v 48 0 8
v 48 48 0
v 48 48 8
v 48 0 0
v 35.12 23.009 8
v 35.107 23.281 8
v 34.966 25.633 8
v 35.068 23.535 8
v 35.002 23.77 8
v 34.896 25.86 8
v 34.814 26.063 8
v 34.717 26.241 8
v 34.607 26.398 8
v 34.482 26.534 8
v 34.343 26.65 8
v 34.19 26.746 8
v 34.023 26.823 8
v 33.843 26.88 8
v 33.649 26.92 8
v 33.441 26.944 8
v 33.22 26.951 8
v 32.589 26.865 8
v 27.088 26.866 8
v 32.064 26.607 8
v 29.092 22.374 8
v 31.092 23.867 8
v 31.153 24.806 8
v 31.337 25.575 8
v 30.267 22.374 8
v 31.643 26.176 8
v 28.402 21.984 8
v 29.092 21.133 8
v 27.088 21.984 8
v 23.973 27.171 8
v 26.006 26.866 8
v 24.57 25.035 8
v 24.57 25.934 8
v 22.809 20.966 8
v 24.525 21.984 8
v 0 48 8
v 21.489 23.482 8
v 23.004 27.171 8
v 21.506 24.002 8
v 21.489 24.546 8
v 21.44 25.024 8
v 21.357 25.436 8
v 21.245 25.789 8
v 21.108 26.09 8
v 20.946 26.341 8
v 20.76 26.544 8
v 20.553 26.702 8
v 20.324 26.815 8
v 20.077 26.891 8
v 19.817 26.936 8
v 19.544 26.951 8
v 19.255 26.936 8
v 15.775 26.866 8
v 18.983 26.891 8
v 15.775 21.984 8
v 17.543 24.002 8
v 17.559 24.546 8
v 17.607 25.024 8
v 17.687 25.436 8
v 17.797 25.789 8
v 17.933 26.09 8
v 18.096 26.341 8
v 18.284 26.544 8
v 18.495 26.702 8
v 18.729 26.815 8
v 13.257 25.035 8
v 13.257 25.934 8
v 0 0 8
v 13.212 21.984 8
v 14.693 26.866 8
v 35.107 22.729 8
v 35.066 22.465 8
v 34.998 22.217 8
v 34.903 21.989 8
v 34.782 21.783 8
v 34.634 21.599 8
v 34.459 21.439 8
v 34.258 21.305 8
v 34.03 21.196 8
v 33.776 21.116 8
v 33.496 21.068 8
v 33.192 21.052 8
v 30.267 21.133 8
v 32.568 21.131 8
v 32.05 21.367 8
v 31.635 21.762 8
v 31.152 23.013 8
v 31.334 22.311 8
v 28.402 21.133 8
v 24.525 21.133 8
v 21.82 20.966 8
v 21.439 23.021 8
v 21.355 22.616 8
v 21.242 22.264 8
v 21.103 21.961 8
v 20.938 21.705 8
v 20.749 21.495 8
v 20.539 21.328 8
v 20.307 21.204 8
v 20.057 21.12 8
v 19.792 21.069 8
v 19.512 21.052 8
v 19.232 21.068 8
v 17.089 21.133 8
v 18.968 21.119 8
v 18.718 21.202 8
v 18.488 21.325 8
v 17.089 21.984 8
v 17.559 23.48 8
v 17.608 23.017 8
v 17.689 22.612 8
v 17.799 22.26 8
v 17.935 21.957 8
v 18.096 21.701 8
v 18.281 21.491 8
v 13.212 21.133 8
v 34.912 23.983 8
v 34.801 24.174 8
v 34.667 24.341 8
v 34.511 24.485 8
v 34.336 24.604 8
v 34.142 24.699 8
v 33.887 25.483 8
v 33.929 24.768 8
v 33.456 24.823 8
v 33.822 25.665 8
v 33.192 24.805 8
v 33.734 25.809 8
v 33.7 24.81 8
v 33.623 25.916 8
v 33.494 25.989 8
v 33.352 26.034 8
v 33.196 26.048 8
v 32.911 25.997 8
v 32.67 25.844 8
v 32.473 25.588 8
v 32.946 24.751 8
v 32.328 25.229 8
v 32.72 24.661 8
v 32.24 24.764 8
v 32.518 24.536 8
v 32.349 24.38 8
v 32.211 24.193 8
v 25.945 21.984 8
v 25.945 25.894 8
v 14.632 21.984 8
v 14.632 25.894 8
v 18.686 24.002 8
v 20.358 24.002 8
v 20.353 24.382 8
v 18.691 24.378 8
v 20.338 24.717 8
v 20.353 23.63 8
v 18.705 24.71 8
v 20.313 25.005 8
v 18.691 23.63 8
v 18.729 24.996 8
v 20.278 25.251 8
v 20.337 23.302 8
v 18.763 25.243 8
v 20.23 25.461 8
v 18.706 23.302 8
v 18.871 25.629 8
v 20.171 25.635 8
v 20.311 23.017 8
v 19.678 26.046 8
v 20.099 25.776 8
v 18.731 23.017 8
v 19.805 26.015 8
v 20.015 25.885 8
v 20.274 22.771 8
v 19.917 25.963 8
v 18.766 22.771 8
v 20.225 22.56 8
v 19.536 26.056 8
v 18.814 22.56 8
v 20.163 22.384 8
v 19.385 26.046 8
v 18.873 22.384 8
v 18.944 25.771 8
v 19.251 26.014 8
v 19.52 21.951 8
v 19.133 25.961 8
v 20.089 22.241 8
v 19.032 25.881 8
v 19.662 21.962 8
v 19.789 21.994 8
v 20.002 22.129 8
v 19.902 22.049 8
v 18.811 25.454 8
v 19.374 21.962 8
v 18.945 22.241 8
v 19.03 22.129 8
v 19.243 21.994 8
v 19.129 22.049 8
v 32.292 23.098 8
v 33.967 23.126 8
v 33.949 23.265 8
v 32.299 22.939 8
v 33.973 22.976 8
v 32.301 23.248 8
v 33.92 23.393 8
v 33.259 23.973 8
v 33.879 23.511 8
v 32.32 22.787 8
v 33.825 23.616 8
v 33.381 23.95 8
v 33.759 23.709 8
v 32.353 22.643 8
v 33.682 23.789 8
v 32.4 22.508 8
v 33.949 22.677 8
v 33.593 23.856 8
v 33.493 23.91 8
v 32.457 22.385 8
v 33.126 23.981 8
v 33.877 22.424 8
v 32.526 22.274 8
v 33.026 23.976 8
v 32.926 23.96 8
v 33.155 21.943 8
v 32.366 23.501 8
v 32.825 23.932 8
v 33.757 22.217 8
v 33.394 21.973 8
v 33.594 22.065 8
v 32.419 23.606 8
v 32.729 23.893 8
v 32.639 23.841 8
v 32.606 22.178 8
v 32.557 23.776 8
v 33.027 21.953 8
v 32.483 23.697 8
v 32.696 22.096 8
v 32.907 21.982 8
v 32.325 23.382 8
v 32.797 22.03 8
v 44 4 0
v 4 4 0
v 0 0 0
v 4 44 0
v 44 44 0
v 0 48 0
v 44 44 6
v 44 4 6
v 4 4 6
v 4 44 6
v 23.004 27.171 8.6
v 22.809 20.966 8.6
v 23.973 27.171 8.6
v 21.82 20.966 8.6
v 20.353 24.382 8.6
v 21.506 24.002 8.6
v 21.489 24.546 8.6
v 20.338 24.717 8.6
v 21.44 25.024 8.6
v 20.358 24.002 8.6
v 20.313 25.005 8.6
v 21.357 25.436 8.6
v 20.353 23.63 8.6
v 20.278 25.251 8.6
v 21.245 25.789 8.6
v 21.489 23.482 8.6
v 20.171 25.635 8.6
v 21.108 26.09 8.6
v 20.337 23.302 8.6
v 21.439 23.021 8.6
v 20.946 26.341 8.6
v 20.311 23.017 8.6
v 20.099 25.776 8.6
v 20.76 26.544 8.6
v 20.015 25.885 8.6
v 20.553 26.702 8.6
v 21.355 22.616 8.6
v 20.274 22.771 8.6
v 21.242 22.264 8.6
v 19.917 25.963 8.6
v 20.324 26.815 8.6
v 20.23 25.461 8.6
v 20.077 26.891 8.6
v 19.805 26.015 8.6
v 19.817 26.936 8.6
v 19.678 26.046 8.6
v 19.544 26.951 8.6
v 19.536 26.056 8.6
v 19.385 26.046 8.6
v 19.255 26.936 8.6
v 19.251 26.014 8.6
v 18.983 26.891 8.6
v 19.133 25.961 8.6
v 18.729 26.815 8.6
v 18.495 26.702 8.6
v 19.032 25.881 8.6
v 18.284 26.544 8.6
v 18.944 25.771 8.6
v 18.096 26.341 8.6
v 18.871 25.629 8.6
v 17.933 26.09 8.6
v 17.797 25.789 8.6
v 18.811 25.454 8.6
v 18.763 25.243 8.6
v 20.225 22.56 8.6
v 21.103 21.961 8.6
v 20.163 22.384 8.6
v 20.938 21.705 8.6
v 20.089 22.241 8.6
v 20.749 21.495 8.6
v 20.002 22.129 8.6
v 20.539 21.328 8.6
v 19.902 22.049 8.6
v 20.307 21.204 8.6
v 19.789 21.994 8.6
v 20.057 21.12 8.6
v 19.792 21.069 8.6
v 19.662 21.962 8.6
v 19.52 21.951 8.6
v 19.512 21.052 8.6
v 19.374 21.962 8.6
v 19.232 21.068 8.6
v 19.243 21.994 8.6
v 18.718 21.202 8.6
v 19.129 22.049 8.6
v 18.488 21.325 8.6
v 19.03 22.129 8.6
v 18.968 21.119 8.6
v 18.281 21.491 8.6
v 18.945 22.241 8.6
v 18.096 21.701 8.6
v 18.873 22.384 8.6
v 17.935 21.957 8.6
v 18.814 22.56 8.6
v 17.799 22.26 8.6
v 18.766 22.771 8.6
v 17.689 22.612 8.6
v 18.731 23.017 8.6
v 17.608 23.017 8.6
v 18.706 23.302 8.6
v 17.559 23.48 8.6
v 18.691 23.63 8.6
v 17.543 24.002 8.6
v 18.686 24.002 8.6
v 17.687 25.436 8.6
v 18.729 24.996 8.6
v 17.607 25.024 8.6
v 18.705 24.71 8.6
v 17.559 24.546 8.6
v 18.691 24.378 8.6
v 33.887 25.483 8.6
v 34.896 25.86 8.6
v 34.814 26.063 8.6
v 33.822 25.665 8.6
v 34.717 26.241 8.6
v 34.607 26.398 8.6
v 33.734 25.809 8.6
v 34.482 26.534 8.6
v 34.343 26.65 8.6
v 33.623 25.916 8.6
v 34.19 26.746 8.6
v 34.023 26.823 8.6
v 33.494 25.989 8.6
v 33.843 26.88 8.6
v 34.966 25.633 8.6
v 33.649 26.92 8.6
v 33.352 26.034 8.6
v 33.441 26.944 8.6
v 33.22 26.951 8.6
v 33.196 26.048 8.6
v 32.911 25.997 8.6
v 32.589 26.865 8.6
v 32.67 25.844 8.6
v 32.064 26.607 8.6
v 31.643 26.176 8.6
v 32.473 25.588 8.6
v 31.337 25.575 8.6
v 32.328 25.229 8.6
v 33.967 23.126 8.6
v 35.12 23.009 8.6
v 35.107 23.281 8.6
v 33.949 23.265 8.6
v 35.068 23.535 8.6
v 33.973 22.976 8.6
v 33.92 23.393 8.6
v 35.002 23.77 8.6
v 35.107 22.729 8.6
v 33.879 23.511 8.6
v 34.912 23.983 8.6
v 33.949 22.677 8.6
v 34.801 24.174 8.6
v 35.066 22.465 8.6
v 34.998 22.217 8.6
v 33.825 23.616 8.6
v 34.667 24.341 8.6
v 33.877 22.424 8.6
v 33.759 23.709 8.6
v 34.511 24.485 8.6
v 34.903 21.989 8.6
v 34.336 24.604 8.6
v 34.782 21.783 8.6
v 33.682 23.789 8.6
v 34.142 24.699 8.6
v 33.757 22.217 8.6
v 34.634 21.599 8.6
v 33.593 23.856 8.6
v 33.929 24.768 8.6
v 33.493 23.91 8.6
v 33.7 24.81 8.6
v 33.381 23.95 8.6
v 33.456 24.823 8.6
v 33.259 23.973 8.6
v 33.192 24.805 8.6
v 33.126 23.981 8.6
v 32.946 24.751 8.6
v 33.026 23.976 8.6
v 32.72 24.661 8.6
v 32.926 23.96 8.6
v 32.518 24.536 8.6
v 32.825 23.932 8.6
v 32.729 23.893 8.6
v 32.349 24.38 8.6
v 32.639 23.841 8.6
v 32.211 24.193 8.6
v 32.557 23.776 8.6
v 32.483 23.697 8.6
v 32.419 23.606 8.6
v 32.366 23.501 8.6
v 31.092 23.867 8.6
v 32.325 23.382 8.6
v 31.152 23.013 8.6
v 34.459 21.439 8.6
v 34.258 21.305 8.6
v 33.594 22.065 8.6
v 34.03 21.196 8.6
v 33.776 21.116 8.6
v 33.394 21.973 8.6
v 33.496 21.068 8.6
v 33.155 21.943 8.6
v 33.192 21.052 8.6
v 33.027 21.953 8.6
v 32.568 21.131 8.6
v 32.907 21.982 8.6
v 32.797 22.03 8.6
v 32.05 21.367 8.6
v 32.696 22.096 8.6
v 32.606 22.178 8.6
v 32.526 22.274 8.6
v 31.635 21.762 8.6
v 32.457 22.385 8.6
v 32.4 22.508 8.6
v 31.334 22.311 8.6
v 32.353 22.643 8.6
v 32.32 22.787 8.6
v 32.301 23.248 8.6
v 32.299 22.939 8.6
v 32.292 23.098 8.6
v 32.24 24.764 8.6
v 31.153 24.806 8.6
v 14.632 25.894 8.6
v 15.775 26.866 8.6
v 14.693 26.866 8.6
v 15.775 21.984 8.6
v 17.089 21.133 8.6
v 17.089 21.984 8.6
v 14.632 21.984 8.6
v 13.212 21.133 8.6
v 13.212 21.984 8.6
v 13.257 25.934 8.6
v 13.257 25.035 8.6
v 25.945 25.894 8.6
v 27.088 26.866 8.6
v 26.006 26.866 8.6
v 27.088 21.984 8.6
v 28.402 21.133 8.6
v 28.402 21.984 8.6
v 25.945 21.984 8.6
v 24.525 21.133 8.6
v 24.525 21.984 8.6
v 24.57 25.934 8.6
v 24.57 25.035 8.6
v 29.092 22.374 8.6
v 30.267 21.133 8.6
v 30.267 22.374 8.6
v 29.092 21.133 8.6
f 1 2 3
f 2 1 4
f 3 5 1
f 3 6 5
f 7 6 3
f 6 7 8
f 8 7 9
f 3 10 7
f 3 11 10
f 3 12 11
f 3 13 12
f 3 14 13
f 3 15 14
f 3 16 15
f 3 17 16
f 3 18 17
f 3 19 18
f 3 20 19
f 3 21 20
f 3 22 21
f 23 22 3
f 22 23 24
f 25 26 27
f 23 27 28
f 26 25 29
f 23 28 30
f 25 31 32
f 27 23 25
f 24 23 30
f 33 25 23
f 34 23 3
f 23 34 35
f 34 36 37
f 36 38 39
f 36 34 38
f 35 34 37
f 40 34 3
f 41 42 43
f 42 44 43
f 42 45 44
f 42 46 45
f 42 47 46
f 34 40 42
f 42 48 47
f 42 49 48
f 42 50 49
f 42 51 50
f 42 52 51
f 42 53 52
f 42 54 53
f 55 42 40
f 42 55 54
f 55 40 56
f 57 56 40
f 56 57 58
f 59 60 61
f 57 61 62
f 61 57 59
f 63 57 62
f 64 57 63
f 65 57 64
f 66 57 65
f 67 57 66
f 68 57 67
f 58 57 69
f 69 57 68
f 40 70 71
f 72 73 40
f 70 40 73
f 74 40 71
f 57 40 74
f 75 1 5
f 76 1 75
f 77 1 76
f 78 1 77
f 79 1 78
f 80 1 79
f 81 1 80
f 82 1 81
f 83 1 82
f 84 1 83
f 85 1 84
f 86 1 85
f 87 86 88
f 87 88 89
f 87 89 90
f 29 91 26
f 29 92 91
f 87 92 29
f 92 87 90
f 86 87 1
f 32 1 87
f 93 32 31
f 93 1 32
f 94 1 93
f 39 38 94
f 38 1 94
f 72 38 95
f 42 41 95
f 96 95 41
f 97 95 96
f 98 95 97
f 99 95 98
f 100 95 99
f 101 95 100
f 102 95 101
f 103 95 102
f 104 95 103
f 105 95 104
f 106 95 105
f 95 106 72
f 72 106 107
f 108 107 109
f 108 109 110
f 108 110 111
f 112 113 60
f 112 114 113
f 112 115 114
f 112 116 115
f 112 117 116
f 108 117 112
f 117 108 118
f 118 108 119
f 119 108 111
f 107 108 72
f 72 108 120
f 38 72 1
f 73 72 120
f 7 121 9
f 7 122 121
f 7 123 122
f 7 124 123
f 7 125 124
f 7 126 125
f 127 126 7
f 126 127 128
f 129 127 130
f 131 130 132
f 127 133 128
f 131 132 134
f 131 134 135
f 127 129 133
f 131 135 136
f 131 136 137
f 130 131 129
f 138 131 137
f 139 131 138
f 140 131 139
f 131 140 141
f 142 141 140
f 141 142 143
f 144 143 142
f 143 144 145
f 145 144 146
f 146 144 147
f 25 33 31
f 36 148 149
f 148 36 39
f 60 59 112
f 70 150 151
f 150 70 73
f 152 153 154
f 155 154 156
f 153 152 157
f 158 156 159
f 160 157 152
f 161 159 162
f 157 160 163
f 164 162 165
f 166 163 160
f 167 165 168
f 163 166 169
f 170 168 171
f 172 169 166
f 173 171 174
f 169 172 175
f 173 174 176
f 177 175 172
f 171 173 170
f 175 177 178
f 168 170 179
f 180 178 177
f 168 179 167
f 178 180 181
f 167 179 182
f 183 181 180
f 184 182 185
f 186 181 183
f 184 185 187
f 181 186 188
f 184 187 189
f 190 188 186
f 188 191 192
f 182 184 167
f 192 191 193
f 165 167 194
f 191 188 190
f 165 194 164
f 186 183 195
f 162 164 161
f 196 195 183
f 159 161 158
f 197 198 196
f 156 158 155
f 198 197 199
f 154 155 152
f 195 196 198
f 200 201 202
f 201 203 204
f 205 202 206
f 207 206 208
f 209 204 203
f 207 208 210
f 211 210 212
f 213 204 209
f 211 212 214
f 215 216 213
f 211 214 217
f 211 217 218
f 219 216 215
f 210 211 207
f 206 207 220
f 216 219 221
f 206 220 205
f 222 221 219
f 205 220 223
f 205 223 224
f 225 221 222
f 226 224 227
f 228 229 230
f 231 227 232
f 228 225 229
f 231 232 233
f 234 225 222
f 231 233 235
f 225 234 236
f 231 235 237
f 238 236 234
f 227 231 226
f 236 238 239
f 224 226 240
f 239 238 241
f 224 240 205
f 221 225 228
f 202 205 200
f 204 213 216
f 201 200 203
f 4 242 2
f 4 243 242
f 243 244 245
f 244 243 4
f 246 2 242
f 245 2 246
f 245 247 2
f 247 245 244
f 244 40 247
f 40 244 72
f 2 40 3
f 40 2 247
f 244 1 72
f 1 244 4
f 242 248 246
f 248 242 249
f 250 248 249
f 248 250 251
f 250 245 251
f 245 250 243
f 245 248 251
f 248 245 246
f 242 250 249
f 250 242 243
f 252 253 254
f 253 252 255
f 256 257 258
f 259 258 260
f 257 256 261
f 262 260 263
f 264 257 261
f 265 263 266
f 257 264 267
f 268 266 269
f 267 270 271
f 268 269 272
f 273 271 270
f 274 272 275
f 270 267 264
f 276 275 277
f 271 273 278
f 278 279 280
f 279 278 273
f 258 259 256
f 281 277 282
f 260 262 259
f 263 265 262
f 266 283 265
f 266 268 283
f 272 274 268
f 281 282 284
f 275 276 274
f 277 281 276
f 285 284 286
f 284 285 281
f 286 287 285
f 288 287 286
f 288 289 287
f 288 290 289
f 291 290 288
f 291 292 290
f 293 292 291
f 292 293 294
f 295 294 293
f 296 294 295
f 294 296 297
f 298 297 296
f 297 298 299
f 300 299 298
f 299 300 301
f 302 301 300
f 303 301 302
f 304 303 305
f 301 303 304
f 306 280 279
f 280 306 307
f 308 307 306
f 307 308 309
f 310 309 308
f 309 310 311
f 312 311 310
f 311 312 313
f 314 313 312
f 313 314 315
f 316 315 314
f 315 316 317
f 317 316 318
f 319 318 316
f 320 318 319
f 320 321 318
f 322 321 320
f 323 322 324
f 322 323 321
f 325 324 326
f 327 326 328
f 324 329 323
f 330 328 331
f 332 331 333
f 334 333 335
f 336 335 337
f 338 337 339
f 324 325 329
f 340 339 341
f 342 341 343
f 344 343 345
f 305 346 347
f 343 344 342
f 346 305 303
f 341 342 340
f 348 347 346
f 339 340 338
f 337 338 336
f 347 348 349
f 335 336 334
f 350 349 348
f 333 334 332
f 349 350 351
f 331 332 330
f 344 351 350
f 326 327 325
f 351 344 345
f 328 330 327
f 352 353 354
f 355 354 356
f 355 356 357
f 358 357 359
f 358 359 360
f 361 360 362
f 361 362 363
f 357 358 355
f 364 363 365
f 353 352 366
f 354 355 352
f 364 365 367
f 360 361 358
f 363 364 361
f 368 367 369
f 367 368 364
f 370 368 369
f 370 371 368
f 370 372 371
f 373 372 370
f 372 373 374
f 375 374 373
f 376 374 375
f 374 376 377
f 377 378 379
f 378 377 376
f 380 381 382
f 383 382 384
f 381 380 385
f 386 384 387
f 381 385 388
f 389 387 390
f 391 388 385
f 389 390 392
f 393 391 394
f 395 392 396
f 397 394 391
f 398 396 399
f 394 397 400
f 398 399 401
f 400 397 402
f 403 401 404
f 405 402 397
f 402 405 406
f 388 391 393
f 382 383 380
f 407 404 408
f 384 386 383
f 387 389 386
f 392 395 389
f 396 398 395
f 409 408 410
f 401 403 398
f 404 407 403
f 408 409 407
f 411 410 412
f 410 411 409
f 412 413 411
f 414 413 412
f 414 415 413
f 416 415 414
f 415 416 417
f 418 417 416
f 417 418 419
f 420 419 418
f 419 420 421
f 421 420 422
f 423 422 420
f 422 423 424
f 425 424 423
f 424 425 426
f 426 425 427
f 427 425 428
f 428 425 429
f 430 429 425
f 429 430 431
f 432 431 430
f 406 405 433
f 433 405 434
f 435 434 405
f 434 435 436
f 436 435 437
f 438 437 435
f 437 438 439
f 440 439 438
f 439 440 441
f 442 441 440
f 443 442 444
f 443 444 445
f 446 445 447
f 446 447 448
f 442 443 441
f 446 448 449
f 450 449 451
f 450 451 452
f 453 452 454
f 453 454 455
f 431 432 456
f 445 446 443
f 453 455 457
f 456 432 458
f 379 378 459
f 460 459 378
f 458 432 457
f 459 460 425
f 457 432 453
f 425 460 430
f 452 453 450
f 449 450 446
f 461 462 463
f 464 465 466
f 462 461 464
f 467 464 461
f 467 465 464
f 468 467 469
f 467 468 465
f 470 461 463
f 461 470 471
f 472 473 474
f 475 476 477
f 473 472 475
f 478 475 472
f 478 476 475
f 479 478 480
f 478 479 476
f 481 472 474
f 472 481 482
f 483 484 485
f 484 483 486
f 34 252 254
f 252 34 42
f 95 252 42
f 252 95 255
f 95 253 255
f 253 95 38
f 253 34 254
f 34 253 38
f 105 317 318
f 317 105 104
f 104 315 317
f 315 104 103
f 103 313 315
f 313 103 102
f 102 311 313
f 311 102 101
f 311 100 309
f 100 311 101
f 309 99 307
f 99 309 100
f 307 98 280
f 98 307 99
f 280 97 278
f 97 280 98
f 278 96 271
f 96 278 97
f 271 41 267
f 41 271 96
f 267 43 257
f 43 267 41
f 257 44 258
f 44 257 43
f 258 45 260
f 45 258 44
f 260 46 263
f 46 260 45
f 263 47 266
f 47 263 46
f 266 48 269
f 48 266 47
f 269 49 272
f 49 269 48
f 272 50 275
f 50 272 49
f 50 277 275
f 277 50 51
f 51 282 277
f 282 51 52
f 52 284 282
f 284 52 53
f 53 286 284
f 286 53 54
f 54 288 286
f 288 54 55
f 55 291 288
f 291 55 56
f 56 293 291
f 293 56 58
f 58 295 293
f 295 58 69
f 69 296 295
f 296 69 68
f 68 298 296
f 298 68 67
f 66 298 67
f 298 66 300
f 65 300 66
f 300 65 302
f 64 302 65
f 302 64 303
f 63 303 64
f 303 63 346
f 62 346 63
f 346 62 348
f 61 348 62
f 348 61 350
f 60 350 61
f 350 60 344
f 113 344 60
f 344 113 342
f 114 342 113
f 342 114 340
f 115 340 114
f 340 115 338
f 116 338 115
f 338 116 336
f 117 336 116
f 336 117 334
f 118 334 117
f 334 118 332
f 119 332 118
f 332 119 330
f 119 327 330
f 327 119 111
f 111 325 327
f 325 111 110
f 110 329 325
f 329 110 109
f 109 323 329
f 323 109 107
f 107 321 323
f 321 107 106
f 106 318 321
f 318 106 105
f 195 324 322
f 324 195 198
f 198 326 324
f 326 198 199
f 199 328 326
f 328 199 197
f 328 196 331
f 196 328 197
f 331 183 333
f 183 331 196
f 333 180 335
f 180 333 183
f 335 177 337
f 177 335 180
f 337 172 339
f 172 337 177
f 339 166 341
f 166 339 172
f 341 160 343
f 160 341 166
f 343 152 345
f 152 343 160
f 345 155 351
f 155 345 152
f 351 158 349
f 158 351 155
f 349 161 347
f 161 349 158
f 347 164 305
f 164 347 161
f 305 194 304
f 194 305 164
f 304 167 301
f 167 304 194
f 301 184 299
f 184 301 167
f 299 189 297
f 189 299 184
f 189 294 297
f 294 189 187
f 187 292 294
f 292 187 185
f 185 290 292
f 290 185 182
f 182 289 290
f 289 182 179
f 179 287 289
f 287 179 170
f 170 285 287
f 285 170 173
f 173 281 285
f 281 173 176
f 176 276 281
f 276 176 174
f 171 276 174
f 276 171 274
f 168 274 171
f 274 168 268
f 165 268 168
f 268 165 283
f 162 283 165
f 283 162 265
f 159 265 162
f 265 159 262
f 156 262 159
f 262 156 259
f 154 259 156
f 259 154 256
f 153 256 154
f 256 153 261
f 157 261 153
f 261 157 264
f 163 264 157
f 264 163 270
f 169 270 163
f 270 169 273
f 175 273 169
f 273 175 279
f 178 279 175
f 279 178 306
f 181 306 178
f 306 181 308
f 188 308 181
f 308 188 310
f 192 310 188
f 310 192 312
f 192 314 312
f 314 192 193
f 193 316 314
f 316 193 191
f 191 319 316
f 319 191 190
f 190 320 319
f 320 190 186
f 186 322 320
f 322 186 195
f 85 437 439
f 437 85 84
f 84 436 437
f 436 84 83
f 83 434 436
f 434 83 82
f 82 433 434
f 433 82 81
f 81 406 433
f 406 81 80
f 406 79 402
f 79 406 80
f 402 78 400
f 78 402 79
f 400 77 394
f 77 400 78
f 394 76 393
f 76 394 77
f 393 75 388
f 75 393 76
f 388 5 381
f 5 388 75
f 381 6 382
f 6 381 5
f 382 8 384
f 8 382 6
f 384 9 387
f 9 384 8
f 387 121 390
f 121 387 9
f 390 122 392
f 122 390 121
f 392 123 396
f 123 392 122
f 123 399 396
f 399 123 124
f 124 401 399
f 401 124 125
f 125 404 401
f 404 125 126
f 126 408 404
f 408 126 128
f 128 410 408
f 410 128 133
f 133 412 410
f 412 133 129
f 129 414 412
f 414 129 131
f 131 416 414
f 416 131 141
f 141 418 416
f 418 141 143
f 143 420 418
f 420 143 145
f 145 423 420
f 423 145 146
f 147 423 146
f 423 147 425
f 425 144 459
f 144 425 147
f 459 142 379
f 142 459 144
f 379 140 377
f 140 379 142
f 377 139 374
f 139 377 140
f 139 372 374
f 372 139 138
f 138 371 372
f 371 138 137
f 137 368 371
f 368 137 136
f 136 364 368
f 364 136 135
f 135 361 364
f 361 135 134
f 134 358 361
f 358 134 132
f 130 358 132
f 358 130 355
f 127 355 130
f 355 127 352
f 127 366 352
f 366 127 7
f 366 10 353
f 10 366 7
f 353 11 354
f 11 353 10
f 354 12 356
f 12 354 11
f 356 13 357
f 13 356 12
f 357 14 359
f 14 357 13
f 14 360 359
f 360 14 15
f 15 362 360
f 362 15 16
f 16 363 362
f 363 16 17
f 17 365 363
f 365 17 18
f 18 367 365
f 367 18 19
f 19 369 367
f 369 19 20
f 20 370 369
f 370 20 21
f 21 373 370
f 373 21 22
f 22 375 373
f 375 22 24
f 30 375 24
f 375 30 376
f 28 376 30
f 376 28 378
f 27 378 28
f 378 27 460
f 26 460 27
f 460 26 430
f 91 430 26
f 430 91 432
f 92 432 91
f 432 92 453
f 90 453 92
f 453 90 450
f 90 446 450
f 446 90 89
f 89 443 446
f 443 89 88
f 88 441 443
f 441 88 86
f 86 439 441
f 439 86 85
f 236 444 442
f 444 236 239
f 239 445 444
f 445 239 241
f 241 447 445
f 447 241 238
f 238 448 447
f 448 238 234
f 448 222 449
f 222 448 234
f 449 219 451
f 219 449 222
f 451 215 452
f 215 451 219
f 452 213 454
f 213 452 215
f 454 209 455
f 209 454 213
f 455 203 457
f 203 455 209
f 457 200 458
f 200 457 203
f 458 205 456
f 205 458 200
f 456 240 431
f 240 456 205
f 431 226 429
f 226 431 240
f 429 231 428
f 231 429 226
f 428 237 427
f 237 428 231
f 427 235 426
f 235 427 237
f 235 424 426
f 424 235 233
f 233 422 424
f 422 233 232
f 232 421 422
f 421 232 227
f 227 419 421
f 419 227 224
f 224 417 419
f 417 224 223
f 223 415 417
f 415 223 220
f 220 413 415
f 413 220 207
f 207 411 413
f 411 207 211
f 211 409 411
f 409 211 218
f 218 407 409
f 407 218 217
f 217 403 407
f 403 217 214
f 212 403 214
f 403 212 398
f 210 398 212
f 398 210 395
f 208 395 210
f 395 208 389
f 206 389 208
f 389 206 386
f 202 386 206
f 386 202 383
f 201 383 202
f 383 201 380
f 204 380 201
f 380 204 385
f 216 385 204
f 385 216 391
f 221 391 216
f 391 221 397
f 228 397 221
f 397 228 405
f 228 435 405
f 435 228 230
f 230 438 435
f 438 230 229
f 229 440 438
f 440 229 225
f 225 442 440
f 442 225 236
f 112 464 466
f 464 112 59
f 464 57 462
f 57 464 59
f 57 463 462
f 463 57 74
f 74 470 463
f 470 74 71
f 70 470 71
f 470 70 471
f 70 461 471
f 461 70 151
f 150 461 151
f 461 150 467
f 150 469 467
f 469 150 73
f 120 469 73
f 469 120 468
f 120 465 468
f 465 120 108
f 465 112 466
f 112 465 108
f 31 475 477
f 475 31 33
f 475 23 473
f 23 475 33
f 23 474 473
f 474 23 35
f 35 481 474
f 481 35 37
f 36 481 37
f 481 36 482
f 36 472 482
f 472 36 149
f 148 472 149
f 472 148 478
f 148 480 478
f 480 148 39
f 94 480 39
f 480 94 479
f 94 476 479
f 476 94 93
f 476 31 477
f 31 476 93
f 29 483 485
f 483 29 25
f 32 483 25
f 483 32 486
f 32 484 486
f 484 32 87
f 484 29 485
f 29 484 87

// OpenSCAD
// Lid bridge specimen (after MakerWorld 2050964, own geometry): a box open at the bottom, 4-mm walls on the bed,
// a roof over a 40 x 40 pocket with its underside at z = 6 — the bridge is anchored on all four sides.
label = "10/1.6";

span = 40;
wall = 4;
under = 6;       // roof underside above the bed
roof = 2;
outer = span + 2 * wall;

difference() {
    cube([outer, outer, under + roof]);
    translate([wall, wall, -1]) cube([span, span, under + 1]);
}
translate([outer / 2, outer / 2, under + roof]) linear_extrude(0.6)
    text(label, size = 6, font = "Liberation Sans:style=Bold", halign = "center", valign = "center");
